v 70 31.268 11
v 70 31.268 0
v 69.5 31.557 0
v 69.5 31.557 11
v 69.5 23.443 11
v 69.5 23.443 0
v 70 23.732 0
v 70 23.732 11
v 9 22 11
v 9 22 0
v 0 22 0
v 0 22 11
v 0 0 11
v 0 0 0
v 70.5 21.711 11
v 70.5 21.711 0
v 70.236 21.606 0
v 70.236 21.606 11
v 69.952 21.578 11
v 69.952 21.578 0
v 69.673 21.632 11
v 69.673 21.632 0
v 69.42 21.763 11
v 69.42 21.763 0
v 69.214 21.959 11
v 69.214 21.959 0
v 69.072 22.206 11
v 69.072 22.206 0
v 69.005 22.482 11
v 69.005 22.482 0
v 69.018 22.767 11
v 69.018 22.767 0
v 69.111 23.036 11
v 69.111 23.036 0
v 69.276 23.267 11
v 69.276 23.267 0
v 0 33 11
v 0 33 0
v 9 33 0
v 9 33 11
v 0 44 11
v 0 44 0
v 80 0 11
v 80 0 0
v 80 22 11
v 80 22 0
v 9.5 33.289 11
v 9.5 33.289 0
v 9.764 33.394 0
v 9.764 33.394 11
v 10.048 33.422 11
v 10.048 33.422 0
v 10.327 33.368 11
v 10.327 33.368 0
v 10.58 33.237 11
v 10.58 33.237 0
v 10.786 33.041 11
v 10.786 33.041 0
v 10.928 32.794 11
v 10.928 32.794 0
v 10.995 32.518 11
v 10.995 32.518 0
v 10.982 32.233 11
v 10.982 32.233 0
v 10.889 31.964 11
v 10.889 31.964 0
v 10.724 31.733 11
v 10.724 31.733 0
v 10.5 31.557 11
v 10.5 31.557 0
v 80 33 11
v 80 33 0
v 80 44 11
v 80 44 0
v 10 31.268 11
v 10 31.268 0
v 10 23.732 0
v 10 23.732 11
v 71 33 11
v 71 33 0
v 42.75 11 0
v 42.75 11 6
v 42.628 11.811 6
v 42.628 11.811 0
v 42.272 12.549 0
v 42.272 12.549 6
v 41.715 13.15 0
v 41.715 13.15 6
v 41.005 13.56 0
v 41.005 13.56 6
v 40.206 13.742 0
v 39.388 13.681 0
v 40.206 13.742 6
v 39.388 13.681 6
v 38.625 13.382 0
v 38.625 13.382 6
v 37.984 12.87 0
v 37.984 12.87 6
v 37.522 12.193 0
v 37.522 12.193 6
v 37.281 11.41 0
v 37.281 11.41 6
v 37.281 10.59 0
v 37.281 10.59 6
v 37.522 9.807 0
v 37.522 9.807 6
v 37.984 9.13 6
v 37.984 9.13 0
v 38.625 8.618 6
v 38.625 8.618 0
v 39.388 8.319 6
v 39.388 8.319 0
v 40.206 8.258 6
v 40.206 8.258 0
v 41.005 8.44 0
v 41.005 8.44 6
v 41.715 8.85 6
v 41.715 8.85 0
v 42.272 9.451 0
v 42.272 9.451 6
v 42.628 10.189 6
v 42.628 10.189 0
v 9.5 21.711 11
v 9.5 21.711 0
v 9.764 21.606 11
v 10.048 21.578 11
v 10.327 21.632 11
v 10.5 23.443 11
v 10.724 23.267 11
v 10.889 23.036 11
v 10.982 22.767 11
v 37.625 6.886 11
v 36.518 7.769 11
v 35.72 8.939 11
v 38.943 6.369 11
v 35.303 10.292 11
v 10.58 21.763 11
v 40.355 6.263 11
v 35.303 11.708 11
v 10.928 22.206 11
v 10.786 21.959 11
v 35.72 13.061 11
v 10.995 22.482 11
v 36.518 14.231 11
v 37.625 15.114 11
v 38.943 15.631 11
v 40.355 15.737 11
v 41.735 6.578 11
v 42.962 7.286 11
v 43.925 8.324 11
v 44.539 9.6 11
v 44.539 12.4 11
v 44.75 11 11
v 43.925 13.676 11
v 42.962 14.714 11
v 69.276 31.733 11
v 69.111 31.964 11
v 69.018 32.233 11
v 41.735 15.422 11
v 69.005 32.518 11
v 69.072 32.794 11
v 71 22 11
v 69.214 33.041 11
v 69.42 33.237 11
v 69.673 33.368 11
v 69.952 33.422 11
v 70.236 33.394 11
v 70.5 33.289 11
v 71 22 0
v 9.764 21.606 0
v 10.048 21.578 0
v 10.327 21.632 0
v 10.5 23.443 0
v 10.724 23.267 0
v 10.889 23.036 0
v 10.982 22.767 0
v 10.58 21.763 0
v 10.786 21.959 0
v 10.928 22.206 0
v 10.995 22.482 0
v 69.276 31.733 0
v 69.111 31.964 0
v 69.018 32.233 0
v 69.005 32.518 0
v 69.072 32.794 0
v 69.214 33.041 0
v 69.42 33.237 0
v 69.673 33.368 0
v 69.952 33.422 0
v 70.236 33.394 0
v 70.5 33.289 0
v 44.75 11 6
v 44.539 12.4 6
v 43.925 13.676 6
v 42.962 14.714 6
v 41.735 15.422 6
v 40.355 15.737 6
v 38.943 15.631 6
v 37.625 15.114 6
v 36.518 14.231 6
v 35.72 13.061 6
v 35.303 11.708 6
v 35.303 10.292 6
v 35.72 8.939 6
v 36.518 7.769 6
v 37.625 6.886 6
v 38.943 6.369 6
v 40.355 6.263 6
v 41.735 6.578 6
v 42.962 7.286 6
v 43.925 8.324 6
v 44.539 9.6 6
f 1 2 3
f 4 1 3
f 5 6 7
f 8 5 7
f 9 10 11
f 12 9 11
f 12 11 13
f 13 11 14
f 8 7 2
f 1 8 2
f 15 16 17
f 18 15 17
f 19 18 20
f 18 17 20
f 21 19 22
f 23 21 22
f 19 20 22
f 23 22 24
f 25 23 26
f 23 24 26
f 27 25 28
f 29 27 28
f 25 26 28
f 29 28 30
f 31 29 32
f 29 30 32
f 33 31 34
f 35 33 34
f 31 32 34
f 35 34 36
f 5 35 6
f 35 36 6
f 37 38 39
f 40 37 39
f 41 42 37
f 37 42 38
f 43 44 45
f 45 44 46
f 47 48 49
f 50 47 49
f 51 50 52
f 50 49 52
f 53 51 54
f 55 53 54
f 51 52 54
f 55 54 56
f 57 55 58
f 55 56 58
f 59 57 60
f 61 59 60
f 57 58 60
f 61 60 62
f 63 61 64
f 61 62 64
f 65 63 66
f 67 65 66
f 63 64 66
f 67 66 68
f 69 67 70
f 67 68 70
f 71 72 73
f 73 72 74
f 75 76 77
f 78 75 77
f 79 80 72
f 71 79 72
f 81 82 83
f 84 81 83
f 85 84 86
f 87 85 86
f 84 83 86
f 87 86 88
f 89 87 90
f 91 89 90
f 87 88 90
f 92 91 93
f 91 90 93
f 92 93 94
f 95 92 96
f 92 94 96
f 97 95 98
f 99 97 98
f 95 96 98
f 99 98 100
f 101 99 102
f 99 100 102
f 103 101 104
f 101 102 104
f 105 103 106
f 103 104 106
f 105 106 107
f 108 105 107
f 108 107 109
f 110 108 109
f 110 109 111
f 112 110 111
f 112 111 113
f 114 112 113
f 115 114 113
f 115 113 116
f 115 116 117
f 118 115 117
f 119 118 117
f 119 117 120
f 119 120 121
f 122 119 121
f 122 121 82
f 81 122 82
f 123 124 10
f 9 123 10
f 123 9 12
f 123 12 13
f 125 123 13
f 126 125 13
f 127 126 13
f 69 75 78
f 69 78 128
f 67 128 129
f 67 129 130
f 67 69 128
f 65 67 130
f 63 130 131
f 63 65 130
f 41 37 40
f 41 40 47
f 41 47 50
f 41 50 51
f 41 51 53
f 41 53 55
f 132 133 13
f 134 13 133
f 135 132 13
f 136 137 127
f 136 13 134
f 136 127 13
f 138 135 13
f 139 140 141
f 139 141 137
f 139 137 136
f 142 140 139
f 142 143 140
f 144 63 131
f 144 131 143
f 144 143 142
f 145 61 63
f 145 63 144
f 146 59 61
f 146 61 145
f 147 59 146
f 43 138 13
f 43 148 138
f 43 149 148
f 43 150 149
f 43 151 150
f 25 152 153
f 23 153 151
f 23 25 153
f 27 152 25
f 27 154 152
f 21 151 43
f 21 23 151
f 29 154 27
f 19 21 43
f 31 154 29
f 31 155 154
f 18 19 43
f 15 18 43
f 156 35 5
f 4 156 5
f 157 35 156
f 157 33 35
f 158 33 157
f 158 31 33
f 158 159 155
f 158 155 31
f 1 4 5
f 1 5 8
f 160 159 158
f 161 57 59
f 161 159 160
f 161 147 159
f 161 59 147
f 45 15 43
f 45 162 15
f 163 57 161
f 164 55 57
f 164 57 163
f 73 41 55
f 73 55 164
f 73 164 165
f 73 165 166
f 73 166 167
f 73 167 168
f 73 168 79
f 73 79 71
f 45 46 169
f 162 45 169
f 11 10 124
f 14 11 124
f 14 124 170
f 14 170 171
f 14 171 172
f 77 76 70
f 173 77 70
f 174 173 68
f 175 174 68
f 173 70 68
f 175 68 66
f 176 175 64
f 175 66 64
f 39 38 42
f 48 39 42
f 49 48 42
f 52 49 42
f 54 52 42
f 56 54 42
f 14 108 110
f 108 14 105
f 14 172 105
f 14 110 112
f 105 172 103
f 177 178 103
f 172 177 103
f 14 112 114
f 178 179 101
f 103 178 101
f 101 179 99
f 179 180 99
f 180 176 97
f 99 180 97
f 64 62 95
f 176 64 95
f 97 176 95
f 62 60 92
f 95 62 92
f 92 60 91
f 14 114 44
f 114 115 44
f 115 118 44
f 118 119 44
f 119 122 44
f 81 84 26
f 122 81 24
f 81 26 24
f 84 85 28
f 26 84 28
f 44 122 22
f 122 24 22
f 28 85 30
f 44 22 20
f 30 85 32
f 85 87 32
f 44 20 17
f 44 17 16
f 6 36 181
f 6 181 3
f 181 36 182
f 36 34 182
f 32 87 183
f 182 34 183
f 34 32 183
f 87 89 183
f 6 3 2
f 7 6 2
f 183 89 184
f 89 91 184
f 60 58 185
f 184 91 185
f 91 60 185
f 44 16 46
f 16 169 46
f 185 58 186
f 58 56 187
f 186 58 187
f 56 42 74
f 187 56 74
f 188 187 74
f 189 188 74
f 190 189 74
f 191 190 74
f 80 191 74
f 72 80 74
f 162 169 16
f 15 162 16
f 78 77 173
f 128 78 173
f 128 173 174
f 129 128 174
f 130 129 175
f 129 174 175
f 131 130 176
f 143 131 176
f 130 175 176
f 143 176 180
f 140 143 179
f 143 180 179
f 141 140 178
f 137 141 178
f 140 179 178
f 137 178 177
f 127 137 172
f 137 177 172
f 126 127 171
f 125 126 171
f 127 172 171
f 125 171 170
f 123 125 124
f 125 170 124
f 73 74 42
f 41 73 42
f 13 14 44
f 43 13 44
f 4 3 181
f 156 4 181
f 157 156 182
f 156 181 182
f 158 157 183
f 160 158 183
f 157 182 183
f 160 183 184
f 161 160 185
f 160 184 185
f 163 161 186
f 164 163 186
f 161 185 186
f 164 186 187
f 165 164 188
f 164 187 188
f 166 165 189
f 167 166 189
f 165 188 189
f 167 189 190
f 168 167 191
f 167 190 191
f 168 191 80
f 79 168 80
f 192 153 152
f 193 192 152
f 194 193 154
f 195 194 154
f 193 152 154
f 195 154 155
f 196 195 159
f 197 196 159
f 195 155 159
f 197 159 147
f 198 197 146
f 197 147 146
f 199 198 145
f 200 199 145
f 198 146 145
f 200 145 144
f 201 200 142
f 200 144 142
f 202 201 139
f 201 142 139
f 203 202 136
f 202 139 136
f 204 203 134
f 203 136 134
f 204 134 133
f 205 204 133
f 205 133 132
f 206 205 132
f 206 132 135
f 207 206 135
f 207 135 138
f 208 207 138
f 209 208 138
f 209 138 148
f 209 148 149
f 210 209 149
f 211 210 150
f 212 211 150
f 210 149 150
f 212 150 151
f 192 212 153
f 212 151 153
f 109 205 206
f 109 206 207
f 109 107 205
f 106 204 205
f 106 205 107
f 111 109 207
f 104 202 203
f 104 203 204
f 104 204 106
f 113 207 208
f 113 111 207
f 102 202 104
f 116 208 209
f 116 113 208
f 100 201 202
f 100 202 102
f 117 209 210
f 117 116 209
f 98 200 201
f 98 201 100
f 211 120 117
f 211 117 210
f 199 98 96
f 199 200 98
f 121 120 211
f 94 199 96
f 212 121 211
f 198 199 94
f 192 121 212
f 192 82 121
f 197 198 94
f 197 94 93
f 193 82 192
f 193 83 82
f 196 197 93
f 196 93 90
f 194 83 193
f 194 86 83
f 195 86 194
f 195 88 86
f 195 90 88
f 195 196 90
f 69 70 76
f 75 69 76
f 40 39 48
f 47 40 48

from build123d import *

# Parameters (mm, degrees)
BOSS_EXTRUDE1_DEPTH = 11
SKETCH2_R           = 4.75
CUT_EXTRUDE1_DEPTH  = 5
CUT_EXTRUDE2_START  = -5
SKETCH2_3_R         = 2.75
CUT_EXTRUDE2_DEPTH  = 87.961948653


with BuildPart() as part:
    # Profile → Boss-Extrude1 (new body)
    with BuildSketch(Plane.XY):
        with BuildLine():
            Line((0, 33), (9, 33))
            Line((9, 33), (9.5, 33.288675135))
            ThreePointArc((9.5, 33.288675135), (10.866025404, 32.922649731), (10.5, 31.556624327))
            Line((10.5, 31.556624327), (10, 31.267949192))
            Line((10, 31.267949192), (10, 23.732050808))
            Line((10, 23.732050808), (10.5, 23.443375673))
            ThreePointArc((10.5, 23.443375673), (10.866025404, 22.077350269), (9.5, 21.711324865))
            Line((9.5, 21.711324865), (9, 22))
            Line((9, 22), (0, 22))
            Line((0, 22), (0, 0))
            Line((0, 0), (80, 0))
            Line((80, 0), (80, 22))
            Line((80, 22), (71, 22))
            Line((71, 22), (70.5, 21.711324865))
            ThreePointArc((70.5, 21.711324865), (69.133974596, 22.077350269), (69.5, 23.443375673))
            Line((69.5, 23.443375673), (70, 23.732050808))
            Line((70, 23.732050808), (70, 31.267949192))
            Line((70, 31.267949192), (69.5, 31.556624327))
            ThreePointArc((69.5, 31.556624327), (69.133974596, 32.922649731), (70.5, 33.288675135))
            Line((70.5, 33.288675135), (71, 33))
            Line((71, 33), (80, 33))
            Line((80, 33), (80, 44))
            Line((80, 44), (0, 44))
            Line((0, 44), (0, 33))
        make_face()
    extrude(amount=BOSS_EXTRUDE1_DEPTH)

    # Sketch2 → Cut-Extrude1 (cut)
    with BuildSketch(Plane.XY.offset(11)):
        with Locations((40, 11)):
            Circle(SKETCH2_R)
    extrude(amount=-CUT_EXTRUDE1_DEPTH, mode=Mode.SUBTRACT)

    # Sketch2<3> → Cut-Extrude2 (cut, through all)
    with BuildSketch(Plane.XY.offset(11).offset(CUT_EXTRUDE2_START)):
        with Locations((40, 11)):
            Circle(SKETCH2_3_R)
    extrude(amount=-CUT_EXTRUDE2_DEPTH, mode=Mode.SUBTRACT)


solid = part.part
